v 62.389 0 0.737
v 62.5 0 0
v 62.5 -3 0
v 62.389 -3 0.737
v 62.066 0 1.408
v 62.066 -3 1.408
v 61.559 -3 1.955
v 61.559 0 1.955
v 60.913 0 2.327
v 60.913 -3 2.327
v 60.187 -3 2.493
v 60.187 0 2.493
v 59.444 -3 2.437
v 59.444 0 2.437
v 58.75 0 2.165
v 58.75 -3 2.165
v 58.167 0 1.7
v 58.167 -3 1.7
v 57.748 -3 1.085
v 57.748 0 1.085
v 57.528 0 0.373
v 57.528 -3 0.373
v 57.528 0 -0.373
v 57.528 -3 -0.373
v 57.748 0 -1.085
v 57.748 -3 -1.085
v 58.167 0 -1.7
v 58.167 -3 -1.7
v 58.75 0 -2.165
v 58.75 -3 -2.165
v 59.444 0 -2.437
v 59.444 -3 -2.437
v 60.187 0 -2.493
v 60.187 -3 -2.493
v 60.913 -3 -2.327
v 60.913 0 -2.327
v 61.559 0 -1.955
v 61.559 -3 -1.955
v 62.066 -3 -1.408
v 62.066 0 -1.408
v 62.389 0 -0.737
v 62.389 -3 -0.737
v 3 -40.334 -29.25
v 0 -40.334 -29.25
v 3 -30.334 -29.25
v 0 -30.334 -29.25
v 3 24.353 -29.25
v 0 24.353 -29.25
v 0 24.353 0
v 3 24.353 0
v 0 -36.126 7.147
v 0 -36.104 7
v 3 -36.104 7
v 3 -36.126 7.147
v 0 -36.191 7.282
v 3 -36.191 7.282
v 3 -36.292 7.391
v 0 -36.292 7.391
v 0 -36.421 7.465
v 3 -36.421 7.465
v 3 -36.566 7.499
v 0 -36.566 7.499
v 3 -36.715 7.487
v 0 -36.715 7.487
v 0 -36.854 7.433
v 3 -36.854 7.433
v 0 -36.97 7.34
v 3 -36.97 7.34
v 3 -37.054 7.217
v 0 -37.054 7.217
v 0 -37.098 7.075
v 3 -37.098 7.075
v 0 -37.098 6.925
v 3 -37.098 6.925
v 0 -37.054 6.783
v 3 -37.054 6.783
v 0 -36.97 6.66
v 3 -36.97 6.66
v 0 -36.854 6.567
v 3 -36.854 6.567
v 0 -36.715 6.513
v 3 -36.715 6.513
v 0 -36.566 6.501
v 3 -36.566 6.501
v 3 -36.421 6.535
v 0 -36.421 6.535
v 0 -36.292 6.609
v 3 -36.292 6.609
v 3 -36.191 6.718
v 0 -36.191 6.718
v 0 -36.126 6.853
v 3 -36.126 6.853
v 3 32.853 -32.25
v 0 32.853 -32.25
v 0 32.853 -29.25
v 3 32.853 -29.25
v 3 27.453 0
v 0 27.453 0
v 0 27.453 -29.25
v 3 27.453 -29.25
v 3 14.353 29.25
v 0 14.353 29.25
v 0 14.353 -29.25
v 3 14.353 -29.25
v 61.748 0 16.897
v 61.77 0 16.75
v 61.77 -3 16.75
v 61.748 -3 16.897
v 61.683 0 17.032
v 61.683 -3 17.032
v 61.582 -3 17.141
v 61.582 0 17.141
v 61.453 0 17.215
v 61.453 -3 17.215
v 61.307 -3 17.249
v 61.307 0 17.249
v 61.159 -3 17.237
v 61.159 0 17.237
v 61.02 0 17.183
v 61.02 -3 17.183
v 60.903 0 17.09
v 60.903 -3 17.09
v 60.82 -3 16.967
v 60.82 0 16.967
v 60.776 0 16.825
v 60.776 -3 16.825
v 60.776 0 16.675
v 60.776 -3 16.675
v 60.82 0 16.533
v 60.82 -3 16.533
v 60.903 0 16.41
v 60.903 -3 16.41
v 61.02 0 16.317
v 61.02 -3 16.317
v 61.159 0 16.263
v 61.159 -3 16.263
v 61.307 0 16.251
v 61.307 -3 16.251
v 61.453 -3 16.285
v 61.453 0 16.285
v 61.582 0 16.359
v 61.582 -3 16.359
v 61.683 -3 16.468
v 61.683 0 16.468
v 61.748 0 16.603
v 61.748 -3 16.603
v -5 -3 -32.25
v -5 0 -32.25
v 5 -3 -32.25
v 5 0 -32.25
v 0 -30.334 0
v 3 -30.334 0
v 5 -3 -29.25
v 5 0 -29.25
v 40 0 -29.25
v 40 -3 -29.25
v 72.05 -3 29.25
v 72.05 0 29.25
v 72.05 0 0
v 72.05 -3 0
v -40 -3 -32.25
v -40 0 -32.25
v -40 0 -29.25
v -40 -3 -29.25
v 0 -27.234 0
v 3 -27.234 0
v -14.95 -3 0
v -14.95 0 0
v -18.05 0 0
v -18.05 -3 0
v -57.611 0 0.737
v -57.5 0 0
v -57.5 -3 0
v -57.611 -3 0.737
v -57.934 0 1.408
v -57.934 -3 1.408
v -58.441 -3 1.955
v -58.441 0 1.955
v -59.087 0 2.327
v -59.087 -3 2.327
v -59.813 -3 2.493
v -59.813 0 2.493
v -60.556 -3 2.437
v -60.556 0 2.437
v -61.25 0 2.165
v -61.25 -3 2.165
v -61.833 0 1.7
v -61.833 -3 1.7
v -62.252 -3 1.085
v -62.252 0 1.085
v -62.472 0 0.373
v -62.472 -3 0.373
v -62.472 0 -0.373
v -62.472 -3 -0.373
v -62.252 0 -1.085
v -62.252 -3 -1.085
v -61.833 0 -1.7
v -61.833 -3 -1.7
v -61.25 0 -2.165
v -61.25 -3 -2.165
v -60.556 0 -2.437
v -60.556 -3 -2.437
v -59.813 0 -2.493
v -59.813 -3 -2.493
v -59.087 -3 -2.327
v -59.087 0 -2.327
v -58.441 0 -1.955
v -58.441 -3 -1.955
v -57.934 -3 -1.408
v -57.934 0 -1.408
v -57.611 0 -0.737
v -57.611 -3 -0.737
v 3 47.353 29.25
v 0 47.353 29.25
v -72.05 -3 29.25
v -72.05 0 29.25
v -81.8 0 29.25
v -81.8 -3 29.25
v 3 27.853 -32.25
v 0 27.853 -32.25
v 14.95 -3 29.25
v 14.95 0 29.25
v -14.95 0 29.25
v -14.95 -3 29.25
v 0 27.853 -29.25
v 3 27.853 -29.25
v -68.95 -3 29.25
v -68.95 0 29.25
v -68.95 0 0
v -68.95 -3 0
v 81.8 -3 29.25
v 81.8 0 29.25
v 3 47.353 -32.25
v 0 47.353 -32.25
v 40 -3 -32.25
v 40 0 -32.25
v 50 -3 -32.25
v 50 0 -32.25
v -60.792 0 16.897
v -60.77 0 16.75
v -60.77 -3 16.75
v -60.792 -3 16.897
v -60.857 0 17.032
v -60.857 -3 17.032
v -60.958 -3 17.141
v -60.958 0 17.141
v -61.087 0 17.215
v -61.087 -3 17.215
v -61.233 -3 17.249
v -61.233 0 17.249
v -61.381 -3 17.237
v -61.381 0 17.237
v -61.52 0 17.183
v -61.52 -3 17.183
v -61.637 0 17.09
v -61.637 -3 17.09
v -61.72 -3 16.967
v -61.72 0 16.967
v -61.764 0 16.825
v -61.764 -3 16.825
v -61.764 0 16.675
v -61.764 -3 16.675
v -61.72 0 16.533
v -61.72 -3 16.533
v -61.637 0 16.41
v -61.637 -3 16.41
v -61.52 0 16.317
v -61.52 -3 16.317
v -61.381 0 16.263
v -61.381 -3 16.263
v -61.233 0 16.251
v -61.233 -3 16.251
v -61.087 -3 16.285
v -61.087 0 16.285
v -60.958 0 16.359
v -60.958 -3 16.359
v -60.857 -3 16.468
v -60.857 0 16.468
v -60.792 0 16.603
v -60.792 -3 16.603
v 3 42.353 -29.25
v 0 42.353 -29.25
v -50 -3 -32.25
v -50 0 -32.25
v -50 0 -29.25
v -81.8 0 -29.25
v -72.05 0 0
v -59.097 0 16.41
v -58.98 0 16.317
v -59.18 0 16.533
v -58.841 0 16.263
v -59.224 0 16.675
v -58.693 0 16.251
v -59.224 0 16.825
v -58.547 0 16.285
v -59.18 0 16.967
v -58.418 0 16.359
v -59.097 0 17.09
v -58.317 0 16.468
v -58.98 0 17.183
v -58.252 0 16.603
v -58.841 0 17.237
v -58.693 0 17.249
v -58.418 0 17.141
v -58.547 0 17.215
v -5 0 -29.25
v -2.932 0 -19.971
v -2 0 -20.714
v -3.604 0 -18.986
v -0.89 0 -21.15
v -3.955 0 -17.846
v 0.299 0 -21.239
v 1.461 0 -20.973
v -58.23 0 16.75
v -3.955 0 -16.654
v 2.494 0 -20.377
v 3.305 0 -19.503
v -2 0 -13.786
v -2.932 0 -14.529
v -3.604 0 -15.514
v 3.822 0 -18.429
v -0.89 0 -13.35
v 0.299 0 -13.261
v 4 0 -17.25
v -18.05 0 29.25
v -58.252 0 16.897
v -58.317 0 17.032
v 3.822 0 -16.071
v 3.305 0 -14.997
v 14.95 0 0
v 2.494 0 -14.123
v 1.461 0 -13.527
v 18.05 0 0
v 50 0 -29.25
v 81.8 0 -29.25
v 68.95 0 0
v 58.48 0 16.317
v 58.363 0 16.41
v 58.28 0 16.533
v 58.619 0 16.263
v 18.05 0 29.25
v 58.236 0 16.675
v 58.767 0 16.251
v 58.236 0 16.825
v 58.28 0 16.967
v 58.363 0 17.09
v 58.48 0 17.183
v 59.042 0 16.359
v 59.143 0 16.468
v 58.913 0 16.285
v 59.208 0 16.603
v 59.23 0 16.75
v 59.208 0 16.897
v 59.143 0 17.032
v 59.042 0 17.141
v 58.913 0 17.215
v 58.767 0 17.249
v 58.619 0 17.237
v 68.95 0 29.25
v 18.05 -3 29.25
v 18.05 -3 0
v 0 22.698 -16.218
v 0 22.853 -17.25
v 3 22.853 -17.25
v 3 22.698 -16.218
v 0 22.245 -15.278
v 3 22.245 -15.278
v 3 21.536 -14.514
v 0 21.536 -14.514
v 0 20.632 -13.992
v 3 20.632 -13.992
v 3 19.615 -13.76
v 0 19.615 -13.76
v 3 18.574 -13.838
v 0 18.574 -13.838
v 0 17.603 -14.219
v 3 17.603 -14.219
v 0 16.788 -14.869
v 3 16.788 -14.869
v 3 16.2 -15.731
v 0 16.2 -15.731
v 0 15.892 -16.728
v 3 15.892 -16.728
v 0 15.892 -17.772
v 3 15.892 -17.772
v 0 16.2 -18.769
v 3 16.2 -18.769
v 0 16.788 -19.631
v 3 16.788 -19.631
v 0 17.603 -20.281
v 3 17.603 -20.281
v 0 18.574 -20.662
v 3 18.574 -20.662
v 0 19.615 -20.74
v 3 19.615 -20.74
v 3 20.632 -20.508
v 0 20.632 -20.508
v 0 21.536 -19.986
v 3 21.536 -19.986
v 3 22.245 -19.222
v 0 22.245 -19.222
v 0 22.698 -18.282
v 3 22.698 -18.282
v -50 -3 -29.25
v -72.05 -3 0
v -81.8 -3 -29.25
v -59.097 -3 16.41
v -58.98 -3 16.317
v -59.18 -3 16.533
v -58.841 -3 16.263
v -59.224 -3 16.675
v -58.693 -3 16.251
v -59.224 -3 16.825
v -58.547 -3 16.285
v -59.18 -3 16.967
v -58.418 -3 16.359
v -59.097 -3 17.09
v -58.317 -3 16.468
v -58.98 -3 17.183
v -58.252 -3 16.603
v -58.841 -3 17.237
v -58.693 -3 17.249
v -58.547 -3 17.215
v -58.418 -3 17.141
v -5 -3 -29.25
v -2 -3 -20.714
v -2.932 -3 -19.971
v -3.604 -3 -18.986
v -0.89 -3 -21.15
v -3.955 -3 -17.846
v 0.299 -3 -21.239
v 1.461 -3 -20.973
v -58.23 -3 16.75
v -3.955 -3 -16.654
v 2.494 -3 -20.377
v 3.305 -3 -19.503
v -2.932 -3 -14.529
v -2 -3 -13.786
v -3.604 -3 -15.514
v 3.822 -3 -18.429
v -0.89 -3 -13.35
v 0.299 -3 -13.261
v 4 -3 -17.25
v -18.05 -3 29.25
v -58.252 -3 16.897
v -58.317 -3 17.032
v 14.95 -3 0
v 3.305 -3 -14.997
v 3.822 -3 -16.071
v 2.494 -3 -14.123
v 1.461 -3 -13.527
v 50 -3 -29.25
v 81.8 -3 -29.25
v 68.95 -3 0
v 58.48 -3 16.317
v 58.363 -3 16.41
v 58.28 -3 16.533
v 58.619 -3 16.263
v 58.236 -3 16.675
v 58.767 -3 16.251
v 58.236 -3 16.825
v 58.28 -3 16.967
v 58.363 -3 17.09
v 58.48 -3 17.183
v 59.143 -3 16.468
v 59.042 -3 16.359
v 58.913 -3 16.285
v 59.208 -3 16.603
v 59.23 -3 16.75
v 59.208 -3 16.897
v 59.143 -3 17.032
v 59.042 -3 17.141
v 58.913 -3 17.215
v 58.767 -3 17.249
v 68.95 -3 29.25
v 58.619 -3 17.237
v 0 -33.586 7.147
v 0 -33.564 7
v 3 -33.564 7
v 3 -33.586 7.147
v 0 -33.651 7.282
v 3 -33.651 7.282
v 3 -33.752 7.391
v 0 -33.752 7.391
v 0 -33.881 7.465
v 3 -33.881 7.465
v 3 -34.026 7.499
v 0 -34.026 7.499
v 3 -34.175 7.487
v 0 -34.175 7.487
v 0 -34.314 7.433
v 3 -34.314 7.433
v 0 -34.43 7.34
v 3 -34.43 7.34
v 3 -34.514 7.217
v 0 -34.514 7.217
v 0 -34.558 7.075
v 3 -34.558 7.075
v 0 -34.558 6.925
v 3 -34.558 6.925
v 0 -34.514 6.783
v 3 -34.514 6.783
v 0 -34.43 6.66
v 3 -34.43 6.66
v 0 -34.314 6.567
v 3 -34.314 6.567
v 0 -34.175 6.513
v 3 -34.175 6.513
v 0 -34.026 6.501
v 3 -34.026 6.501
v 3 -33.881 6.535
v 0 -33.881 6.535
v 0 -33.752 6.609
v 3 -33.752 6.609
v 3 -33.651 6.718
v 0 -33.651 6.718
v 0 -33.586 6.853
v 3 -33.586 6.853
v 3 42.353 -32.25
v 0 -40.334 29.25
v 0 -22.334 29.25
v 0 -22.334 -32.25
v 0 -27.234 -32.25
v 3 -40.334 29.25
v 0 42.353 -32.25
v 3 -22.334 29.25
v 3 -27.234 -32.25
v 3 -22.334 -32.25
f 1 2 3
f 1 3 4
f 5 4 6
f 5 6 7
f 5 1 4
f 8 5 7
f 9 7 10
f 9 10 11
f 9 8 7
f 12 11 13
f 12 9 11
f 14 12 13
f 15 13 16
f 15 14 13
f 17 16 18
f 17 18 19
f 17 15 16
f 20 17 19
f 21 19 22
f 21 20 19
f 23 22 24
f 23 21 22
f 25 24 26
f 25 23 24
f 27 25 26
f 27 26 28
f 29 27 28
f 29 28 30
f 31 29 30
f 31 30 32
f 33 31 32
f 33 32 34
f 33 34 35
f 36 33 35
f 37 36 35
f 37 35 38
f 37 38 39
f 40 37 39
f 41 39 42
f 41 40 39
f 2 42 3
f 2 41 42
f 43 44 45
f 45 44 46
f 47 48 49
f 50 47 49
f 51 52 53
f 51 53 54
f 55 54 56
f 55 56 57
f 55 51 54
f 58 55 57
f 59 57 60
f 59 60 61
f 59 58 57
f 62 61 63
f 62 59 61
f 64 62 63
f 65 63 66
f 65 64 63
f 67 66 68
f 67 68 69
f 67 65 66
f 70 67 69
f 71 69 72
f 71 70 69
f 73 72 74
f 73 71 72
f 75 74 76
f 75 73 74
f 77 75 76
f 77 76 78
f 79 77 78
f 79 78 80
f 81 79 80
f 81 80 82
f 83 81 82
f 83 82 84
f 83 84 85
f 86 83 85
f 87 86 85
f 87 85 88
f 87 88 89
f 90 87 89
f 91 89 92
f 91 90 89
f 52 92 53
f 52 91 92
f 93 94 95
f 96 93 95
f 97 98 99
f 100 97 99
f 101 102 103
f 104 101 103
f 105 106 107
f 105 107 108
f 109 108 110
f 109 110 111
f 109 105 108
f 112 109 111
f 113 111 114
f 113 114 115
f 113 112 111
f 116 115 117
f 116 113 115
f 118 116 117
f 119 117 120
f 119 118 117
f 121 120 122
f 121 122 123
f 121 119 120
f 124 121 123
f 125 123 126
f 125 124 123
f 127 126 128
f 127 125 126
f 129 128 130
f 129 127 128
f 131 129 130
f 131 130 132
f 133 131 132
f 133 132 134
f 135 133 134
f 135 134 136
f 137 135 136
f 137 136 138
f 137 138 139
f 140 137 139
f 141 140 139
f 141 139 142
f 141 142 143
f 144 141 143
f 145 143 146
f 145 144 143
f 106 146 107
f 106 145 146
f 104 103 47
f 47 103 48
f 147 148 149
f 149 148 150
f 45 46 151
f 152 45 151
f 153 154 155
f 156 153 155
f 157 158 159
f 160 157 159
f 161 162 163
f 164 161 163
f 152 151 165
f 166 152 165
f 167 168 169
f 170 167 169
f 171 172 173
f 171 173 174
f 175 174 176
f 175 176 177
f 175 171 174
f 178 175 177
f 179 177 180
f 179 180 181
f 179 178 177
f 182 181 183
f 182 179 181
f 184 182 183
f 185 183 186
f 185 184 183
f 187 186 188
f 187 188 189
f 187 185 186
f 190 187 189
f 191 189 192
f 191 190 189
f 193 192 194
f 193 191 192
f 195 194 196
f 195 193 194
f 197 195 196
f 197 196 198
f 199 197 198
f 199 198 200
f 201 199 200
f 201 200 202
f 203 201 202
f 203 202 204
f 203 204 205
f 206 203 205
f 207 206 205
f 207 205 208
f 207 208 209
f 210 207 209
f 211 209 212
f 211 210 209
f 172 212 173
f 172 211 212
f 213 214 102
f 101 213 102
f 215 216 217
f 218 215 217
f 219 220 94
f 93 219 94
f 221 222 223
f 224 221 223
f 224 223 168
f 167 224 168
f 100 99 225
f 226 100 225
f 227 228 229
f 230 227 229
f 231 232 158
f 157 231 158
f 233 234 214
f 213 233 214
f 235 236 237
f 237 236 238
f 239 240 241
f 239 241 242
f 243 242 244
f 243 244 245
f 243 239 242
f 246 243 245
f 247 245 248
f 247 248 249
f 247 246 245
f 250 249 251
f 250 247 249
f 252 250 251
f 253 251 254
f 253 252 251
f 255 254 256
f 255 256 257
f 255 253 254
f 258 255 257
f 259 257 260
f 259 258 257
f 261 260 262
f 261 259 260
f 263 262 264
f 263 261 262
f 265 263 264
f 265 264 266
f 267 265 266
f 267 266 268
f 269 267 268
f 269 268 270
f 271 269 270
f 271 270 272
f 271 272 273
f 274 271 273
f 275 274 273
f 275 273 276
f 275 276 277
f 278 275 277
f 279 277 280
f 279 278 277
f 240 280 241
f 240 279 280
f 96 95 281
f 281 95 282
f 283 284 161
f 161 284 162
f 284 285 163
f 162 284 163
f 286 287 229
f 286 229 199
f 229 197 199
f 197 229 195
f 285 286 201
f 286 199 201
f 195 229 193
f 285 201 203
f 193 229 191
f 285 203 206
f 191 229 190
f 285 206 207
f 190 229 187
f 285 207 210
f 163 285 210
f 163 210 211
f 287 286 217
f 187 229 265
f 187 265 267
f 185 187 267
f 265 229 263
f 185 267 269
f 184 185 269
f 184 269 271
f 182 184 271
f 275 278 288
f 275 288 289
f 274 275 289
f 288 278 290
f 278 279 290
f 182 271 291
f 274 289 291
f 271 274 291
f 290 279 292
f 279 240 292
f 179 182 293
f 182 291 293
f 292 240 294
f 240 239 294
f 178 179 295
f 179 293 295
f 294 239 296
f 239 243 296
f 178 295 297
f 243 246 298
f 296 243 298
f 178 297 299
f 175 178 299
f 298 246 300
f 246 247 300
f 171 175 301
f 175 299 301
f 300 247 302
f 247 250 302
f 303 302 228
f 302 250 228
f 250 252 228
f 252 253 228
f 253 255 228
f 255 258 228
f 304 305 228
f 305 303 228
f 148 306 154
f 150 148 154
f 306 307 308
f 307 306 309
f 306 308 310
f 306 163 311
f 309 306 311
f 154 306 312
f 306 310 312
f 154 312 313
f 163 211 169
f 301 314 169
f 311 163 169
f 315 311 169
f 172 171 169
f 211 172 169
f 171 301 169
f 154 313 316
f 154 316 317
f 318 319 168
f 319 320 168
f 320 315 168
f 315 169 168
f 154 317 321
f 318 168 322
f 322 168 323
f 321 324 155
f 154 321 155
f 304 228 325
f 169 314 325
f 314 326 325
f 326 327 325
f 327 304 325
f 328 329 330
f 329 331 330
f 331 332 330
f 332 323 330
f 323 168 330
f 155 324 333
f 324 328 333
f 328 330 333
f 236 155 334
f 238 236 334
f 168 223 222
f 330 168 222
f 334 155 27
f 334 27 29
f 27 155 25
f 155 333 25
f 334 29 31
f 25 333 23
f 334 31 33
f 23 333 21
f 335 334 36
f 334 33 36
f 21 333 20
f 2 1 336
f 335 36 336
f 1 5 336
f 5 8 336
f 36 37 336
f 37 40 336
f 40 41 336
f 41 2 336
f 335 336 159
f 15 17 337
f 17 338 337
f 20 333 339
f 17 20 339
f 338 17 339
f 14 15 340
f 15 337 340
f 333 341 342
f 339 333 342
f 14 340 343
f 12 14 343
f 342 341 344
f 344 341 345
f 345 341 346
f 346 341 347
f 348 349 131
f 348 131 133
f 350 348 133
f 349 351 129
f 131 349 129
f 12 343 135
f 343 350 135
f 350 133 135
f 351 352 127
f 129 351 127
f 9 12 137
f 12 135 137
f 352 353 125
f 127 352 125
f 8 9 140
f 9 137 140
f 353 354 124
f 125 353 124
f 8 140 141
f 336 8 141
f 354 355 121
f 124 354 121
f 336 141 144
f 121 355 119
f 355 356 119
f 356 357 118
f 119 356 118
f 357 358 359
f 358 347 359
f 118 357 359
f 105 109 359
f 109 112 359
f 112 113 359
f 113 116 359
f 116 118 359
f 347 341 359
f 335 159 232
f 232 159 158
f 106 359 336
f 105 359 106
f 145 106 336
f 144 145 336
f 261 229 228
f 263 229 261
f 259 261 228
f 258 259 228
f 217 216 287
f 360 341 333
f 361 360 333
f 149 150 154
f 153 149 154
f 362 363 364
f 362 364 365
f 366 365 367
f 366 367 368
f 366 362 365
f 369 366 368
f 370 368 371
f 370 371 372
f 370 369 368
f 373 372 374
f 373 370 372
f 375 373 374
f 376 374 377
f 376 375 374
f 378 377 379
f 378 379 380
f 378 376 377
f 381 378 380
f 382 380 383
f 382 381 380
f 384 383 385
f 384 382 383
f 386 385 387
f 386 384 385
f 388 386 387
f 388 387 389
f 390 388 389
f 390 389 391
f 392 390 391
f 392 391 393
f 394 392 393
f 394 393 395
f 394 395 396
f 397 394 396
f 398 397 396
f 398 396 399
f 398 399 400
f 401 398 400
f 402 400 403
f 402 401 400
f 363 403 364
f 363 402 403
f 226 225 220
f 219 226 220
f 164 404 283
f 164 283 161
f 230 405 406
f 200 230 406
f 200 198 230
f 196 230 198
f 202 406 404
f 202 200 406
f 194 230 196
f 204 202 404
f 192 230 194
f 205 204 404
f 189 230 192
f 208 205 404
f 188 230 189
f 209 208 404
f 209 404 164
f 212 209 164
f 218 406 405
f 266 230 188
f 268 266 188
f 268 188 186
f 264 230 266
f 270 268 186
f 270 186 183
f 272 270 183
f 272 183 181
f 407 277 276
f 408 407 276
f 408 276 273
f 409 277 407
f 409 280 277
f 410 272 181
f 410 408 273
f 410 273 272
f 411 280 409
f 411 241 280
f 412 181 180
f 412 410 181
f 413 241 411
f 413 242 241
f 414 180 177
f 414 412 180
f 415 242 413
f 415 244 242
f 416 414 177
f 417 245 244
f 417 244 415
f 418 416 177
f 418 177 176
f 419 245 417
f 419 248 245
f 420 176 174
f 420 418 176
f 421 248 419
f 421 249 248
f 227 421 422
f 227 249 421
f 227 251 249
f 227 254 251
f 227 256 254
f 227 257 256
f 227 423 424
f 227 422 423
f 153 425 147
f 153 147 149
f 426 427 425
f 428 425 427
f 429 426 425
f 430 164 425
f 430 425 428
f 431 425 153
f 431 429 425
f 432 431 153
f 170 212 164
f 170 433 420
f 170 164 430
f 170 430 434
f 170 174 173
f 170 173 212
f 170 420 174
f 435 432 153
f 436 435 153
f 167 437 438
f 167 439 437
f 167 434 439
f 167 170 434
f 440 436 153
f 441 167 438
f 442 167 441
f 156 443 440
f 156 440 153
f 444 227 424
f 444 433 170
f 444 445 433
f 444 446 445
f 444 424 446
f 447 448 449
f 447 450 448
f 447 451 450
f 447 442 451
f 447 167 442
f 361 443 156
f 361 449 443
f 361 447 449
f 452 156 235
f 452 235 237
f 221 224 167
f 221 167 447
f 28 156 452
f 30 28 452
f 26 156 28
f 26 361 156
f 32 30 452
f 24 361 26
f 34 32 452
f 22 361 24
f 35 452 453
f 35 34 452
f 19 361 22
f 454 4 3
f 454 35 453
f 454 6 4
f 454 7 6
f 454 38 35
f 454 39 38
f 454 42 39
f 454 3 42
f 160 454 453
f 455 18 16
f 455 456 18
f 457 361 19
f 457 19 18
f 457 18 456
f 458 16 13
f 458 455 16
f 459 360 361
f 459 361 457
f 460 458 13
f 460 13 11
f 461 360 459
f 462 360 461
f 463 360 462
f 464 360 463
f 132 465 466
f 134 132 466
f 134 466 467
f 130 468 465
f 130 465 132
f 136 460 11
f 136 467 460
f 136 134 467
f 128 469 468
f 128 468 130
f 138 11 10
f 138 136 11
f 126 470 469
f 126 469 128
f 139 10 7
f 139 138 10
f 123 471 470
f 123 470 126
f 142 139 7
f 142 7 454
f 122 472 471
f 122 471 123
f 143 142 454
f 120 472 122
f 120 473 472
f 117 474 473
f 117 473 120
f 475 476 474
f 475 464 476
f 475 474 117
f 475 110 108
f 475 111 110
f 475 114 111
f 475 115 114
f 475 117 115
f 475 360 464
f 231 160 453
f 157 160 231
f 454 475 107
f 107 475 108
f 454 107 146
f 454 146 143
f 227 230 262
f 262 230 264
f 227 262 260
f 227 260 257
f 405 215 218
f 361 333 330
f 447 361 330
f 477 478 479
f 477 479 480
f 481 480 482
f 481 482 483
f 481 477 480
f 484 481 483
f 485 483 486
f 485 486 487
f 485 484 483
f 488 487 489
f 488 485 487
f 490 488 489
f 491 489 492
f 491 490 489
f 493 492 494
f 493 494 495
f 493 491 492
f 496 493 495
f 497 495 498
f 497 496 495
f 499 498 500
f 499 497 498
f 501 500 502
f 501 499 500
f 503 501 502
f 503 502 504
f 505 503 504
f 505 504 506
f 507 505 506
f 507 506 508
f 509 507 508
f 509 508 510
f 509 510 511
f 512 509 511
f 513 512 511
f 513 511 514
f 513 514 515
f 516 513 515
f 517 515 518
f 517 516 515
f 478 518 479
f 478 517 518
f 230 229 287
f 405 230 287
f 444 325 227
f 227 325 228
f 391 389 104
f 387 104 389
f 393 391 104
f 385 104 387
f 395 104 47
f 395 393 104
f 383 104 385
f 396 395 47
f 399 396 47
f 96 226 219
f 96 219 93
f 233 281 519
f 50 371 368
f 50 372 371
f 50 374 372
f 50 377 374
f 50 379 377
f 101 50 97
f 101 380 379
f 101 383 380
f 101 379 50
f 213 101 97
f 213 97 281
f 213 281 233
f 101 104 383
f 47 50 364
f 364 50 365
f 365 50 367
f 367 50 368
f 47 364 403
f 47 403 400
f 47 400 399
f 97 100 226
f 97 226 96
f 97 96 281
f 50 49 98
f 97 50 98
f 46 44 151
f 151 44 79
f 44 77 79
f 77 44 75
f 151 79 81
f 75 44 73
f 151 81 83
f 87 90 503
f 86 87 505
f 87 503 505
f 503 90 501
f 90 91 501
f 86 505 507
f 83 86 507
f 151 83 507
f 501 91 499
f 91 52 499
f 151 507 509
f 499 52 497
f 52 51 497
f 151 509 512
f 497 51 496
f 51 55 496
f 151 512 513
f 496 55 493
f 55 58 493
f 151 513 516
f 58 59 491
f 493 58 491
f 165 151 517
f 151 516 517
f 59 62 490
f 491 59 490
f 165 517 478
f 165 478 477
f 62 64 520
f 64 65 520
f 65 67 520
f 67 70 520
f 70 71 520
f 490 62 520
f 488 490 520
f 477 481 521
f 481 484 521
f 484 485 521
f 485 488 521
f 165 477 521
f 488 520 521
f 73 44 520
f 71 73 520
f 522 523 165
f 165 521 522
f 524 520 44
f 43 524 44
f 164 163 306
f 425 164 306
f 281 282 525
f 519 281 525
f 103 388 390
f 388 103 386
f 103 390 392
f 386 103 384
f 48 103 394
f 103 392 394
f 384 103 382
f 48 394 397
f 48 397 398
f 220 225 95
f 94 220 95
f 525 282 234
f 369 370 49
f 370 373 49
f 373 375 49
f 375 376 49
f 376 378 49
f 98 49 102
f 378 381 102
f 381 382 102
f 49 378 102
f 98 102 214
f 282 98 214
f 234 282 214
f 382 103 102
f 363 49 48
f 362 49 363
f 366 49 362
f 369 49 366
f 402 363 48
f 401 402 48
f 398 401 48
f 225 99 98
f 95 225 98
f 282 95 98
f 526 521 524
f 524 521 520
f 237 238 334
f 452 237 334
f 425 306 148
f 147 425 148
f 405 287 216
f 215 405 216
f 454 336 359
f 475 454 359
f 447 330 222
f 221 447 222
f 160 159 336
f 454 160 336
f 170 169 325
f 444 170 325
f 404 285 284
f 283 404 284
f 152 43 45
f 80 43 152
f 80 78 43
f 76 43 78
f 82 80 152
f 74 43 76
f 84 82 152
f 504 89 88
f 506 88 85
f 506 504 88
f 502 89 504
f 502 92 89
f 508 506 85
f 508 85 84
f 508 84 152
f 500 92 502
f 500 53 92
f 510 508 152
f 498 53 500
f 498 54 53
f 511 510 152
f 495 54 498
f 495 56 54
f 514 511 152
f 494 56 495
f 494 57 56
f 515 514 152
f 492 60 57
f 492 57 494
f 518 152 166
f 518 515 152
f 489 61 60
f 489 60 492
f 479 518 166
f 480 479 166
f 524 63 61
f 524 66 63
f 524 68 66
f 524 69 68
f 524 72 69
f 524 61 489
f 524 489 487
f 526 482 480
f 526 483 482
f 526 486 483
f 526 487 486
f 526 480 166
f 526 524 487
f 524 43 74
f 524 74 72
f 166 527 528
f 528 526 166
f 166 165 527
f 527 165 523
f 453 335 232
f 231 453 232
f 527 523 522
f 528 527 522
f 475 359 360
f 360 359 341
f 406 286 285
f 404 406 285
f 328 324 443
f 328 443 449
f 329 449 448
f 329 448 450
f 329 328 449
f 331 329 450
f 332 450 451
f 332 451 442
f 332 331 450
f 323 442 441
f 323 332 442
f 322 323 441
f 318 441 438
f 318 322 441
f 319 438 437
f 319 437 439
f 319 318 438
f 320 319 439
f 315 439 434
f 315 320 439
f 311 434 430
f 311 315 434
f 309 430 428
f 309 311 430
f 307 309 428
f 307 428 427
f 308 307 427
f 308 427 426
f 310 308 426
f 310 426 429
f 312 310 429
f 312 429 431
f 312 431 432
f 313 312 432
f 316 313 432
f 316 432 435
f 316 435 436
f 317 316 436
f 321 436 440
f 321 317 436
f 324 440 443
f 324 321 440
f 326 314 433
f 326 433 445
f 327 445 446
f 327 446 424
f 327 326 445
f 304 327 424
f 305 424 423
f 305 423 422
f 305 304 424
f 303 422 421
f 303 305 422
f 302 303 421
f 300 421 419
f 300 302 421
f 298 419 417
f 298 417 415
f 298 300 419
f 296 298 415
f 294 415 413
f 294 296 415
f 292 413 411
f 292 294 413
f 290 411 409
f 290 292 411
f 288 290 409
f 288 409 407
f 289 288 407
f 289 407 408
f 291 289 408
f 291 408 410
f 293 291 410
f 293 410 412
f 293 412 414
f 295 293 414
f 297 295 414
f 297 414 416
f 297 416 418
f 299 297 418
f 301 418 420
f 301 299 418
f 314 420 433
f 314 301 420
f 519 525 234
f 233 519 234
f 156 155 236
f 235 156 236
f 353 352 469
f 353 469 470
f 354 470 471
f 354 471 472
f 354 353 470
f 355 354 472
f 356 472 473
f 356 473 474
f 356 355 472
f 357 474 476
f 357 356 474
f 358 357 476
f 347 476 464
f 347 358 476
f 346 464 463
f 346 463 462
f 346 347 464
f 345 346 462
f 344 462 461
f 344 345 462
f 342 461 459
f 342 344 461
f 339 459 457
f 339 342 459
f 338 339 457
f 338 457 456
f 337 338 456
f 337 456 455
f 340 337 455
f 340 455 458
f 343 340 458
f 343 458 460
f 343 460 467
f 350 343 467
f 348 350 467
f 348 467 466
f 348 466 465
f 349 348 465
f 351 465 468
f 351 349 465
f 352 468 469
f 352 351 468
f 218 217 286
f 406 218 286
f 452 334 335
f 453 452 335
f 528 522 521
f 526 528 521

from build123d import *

# Parameters (mm, degrees)
F0_R     = 4
F0_R_2   = 2.5
F0_R_3   = 0.5
F1_DEPTH = 3
F2_R     = 0.5
F4_DEPTH = 3
F3_R     = 3.5
F5_DEPTH = 3


with BuildPart() as f1:
    # F0 (on Front) → F1 (new body)
    with BuildSketch(Plane.XZ):
        Polygon((50, -29.25), (81.8, -29.25), (81.8, 29.25), (72.05, 29.25), (72.05, 0), (68.95, 0), (68.95, 29.25), (18.05, 29.25), (18.05, 0), (14.95, 0), (14.95, 29.25), (-14.95, 29.25), (-14.95, 0), (-18.05, 0), (-18.05, 29.25), (-68.95, 29.25), (-68.95, 0), (-72.05, 0), (-72.05, 29.25), (-81.8, 29.25), (-81.8, -29.25), (-50, -29.25), (-50, -32.25), (-40, -32.25), (-40, -29.25), (-5, -29.25), (-5, -32.25), (5, -32.25), (5, -29.25), (40, -29.25), (40, -32.25), (50, -32.25), align=None)
        with Locations((0, -17.25)):
            Circle(F0_R, mode=Mode.SUBTRACT)
        with Locations((-60, 0)):
            Circle(F0_R_2, mode=Mode.SUBTRACT)
        with Locations((-61.27, 16.75)):
            Circle(F0_R_3, mode=Mode.SUBTRACT)
        with Locations((-58.73, 16.75)):
            Circle(F0_R_3, mode=Mode.SUBTRACT)
        with Locations((60, 0)):
            Circle(F0_R_2, mode=Mode.SUBTRACT)
        with Locations((58.73, 16.75)):
            Circle(F0_R_3, mode=Mode.SUBTRACT)
        with Locations((61.27, 16.75)):
            Circle(F0_R_3, mode=Mode.SUBTRACT)
    extrude(amount=F1_DEPTH)


with BuildPart() as f4:
    # F2 (on Right) → F4 (new body)
    with BuildSketch(Plane.YZ):
        Polygon((-22.333752, -29.25), (-22.333752, 29.25), (-40.333752, 29.25), (-40.333752, -29.25), (-30.333752, -29.25), (-30.333752, 0), (-27.233752, 0), (-27.233752, -29.25), (-27.233752, -32.25), (-22.333752, -32.25), align=None)
        with Locations((-36.603752, 7)):
            Circle(F2_R, mode=Mode.SUBTRACT)
        with Locations((-34.063752, 7)):
            Circle(F2_R, mode=Mode.SUBTRACT)
    extrude(amount=F4_DEPTH)


with BuildPart() as f5:
    # F3 (on Right) → F5 (new body)
    with BuildSketch(Plane.YZ):
        Polygon((47.353302, 29.25), (14.353302, 29.25), (14.353302, -29.25), (24.353302, -29.25), (24.353302, 0), (27.453302, 0), (27.453302, -29.25), (27.853302, -29.25), (27.853302, -32.25), (32.853302, -32.25), (32.853302, -29.25), (42.353302, -29.25), (42.353302, -32.25), (47.353302, -32.25), (47.353302, -29.25), align=None)
        with Locations((19.353302, -17.25)):
            Circle(F3_R, mode=Mode.SUBTRACT)
    extrude(amount=F5_DEPTH)


solid = Compound([f1.part, f4.part, f5.part])
